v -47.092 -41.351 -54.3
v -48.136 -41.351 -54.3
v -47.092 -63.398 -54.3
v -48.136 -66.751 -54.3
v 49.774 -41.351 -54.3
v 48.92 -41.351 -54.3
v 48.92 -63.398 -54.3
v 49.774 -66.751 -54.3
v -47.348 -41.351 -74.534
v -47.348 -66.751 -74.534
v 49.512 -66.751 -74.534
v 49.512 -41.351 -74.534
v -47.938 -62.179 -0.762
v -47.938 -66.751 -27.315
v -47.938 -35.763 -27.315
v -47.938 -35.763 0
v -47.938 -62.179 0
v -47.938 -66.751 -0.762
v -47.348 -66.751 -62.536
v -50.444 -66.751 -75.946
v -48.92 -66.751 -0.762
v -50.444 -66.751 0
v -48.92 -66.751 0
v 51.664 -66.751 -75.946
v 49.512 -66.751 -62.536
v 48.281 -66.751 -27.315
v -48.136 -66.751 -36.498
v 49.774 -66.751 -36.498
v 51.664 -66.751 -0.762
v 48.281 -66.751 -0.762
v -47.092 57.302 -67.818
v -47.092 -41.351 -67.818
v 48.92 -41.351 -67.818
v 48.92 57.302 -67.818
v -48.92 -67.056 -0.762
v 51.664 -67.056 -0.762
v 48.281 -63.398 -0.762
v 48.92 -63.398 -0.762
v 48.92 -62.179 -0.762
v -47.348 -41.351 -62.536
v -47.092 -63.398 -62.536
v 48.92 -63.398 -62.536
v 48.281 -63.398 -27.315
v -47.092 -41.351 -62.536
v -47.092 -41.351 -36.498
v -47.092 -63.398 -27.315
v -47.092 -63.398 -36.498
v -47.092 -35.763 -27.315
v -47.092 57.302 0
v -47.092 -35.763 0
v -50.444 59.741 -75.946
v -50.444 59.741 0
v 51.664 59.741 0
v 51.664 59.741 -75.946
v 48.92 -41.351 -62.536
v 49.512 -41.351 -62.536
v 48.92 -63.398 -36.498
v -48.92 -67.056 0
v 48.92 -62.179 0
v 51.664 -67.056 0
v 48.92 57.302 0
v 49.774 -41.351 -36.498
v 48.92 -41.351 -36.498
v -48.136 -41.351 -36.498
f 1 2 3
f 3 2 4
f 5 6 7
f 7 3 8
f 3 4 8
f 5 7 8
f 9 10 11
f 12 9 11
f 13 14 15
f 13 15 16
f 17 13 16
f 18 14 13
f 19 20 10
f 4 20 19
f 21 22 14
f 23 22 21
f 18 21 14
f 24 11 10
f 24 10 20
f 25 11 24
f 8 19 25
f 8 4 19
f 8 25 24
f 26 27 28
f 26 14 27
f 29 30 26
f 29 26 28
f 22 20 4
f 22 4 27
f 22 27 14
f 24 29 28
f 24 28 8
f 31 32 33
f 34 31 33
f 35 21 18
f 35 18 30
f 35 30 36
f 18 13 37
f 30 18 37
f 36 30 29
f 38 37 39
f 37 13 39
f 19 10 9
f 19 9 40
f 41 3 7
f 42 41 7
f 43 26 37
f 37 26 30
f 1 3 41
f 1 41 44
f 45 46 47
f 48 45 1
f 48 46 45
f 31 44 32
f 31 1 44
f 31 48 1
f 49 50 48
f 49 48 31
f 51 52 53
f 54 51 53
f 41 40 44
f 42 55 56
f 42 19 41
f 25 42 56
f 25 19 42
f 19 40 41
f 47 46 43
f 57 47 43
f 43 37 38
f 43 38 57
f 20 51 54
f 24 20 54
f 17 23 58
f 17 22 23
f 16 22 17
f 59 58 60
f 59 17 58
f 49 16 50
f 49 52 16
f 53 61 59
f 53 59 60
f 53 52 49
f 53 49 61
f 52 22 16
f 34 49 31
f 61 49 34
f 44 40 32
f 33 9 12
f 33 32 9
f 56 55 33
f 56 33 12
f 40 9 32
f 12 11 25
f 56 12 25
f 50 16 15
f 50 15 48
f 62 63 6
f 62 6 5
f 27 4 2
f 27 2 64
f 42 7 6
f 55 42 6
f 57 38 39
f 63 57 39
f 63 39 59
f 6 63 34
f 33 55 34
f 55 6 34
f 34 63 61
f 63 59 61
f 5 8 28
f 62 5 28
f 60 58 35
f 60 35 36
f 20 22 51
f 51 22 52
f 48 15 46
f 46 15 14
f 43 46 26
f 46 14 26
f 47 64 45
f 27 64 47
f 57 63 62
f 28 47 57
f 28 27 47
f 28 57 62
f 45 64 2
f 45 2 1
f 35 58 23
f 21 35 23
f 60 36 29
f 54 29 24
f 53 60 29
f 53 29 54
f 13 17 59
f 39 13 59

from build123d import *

# Parameters (mm, degrees)
F0_W      = 102.108002
F0_H      = 126.492004
F1_DEPTH  = 75.946
F2_W      = 96.012
F2_H      = 120.700798
F3_DEPTH  = 67.818
F5_W      = 96.219298
F5_H      = 27.314827
F6_DEPTH  = 30.988
F7_W      = 97.910039
F7_H      = 17.801825
F8_DEPTH  = 25.4
F9_W      = 96.860379
F9_H      = 11.997812
F10_DEPTH = 25.4
F11_W     = 100.584
F11_H     = 4.876796
F12_DEPTH = 0.762


with BuildPart() as f1:
    # F0 (on Top) → F1 (new body)
    with BuildSketch(Plane.XY):
        with Locations((0.609599, -3.505202)):
            Rectangle(F0_W, F0_H)
    extrude(amount=-F1_DEPTH)

    # F2 (on face) → F3 (cut)
    with BuildSketch(Plane.XY):
        with Locations((0.9144, -3.047999)):
            Rectangle(F2_W, F2_H)
    extrude(amount=-F3_DEPTH, mode=Mode.SUBTRACT)

    # F5 (on face) → F6 (cut)
    with BuildSketch(Plane.XZ.offset(66.751204)):
        with Locations((0.171637, -13.657413)):
            Rectangle(F5_W, F5_H)
    extrude(amount=-F6_DEPTH, mode=Mode.SUBTRACT)

    # F7 (on face) → F8 (cut)
    with BuildSketch(Plane.XZ.offset(66.751204)):
        with Locations((0.818689, -45.399124)):
            Rectangle(F7_W, F7_H)
    extrude(amount=-F8_DEPTH, mode=Mode.SUBTRACT)

    # F9 (on face) → F10 (cut)
    with BuildSketch(Plane.XZ.offset(66.751204)):
        with Locations((1.082152, -68.534743)):
            Rectangle(F9_W, F9_H)
    extrude(amount=-F10_DEPTH, mode=Mode.SUBTRACT)

    # F11 (on Top) → F12 (join)
    with BuildSketch(Plane.XY):
        with Locations((1.3716, -64.617602)):
            Rectangle(F11_W, F11_H)
    extrude(amount=-F12_DEPTH)


solid = f1.part
